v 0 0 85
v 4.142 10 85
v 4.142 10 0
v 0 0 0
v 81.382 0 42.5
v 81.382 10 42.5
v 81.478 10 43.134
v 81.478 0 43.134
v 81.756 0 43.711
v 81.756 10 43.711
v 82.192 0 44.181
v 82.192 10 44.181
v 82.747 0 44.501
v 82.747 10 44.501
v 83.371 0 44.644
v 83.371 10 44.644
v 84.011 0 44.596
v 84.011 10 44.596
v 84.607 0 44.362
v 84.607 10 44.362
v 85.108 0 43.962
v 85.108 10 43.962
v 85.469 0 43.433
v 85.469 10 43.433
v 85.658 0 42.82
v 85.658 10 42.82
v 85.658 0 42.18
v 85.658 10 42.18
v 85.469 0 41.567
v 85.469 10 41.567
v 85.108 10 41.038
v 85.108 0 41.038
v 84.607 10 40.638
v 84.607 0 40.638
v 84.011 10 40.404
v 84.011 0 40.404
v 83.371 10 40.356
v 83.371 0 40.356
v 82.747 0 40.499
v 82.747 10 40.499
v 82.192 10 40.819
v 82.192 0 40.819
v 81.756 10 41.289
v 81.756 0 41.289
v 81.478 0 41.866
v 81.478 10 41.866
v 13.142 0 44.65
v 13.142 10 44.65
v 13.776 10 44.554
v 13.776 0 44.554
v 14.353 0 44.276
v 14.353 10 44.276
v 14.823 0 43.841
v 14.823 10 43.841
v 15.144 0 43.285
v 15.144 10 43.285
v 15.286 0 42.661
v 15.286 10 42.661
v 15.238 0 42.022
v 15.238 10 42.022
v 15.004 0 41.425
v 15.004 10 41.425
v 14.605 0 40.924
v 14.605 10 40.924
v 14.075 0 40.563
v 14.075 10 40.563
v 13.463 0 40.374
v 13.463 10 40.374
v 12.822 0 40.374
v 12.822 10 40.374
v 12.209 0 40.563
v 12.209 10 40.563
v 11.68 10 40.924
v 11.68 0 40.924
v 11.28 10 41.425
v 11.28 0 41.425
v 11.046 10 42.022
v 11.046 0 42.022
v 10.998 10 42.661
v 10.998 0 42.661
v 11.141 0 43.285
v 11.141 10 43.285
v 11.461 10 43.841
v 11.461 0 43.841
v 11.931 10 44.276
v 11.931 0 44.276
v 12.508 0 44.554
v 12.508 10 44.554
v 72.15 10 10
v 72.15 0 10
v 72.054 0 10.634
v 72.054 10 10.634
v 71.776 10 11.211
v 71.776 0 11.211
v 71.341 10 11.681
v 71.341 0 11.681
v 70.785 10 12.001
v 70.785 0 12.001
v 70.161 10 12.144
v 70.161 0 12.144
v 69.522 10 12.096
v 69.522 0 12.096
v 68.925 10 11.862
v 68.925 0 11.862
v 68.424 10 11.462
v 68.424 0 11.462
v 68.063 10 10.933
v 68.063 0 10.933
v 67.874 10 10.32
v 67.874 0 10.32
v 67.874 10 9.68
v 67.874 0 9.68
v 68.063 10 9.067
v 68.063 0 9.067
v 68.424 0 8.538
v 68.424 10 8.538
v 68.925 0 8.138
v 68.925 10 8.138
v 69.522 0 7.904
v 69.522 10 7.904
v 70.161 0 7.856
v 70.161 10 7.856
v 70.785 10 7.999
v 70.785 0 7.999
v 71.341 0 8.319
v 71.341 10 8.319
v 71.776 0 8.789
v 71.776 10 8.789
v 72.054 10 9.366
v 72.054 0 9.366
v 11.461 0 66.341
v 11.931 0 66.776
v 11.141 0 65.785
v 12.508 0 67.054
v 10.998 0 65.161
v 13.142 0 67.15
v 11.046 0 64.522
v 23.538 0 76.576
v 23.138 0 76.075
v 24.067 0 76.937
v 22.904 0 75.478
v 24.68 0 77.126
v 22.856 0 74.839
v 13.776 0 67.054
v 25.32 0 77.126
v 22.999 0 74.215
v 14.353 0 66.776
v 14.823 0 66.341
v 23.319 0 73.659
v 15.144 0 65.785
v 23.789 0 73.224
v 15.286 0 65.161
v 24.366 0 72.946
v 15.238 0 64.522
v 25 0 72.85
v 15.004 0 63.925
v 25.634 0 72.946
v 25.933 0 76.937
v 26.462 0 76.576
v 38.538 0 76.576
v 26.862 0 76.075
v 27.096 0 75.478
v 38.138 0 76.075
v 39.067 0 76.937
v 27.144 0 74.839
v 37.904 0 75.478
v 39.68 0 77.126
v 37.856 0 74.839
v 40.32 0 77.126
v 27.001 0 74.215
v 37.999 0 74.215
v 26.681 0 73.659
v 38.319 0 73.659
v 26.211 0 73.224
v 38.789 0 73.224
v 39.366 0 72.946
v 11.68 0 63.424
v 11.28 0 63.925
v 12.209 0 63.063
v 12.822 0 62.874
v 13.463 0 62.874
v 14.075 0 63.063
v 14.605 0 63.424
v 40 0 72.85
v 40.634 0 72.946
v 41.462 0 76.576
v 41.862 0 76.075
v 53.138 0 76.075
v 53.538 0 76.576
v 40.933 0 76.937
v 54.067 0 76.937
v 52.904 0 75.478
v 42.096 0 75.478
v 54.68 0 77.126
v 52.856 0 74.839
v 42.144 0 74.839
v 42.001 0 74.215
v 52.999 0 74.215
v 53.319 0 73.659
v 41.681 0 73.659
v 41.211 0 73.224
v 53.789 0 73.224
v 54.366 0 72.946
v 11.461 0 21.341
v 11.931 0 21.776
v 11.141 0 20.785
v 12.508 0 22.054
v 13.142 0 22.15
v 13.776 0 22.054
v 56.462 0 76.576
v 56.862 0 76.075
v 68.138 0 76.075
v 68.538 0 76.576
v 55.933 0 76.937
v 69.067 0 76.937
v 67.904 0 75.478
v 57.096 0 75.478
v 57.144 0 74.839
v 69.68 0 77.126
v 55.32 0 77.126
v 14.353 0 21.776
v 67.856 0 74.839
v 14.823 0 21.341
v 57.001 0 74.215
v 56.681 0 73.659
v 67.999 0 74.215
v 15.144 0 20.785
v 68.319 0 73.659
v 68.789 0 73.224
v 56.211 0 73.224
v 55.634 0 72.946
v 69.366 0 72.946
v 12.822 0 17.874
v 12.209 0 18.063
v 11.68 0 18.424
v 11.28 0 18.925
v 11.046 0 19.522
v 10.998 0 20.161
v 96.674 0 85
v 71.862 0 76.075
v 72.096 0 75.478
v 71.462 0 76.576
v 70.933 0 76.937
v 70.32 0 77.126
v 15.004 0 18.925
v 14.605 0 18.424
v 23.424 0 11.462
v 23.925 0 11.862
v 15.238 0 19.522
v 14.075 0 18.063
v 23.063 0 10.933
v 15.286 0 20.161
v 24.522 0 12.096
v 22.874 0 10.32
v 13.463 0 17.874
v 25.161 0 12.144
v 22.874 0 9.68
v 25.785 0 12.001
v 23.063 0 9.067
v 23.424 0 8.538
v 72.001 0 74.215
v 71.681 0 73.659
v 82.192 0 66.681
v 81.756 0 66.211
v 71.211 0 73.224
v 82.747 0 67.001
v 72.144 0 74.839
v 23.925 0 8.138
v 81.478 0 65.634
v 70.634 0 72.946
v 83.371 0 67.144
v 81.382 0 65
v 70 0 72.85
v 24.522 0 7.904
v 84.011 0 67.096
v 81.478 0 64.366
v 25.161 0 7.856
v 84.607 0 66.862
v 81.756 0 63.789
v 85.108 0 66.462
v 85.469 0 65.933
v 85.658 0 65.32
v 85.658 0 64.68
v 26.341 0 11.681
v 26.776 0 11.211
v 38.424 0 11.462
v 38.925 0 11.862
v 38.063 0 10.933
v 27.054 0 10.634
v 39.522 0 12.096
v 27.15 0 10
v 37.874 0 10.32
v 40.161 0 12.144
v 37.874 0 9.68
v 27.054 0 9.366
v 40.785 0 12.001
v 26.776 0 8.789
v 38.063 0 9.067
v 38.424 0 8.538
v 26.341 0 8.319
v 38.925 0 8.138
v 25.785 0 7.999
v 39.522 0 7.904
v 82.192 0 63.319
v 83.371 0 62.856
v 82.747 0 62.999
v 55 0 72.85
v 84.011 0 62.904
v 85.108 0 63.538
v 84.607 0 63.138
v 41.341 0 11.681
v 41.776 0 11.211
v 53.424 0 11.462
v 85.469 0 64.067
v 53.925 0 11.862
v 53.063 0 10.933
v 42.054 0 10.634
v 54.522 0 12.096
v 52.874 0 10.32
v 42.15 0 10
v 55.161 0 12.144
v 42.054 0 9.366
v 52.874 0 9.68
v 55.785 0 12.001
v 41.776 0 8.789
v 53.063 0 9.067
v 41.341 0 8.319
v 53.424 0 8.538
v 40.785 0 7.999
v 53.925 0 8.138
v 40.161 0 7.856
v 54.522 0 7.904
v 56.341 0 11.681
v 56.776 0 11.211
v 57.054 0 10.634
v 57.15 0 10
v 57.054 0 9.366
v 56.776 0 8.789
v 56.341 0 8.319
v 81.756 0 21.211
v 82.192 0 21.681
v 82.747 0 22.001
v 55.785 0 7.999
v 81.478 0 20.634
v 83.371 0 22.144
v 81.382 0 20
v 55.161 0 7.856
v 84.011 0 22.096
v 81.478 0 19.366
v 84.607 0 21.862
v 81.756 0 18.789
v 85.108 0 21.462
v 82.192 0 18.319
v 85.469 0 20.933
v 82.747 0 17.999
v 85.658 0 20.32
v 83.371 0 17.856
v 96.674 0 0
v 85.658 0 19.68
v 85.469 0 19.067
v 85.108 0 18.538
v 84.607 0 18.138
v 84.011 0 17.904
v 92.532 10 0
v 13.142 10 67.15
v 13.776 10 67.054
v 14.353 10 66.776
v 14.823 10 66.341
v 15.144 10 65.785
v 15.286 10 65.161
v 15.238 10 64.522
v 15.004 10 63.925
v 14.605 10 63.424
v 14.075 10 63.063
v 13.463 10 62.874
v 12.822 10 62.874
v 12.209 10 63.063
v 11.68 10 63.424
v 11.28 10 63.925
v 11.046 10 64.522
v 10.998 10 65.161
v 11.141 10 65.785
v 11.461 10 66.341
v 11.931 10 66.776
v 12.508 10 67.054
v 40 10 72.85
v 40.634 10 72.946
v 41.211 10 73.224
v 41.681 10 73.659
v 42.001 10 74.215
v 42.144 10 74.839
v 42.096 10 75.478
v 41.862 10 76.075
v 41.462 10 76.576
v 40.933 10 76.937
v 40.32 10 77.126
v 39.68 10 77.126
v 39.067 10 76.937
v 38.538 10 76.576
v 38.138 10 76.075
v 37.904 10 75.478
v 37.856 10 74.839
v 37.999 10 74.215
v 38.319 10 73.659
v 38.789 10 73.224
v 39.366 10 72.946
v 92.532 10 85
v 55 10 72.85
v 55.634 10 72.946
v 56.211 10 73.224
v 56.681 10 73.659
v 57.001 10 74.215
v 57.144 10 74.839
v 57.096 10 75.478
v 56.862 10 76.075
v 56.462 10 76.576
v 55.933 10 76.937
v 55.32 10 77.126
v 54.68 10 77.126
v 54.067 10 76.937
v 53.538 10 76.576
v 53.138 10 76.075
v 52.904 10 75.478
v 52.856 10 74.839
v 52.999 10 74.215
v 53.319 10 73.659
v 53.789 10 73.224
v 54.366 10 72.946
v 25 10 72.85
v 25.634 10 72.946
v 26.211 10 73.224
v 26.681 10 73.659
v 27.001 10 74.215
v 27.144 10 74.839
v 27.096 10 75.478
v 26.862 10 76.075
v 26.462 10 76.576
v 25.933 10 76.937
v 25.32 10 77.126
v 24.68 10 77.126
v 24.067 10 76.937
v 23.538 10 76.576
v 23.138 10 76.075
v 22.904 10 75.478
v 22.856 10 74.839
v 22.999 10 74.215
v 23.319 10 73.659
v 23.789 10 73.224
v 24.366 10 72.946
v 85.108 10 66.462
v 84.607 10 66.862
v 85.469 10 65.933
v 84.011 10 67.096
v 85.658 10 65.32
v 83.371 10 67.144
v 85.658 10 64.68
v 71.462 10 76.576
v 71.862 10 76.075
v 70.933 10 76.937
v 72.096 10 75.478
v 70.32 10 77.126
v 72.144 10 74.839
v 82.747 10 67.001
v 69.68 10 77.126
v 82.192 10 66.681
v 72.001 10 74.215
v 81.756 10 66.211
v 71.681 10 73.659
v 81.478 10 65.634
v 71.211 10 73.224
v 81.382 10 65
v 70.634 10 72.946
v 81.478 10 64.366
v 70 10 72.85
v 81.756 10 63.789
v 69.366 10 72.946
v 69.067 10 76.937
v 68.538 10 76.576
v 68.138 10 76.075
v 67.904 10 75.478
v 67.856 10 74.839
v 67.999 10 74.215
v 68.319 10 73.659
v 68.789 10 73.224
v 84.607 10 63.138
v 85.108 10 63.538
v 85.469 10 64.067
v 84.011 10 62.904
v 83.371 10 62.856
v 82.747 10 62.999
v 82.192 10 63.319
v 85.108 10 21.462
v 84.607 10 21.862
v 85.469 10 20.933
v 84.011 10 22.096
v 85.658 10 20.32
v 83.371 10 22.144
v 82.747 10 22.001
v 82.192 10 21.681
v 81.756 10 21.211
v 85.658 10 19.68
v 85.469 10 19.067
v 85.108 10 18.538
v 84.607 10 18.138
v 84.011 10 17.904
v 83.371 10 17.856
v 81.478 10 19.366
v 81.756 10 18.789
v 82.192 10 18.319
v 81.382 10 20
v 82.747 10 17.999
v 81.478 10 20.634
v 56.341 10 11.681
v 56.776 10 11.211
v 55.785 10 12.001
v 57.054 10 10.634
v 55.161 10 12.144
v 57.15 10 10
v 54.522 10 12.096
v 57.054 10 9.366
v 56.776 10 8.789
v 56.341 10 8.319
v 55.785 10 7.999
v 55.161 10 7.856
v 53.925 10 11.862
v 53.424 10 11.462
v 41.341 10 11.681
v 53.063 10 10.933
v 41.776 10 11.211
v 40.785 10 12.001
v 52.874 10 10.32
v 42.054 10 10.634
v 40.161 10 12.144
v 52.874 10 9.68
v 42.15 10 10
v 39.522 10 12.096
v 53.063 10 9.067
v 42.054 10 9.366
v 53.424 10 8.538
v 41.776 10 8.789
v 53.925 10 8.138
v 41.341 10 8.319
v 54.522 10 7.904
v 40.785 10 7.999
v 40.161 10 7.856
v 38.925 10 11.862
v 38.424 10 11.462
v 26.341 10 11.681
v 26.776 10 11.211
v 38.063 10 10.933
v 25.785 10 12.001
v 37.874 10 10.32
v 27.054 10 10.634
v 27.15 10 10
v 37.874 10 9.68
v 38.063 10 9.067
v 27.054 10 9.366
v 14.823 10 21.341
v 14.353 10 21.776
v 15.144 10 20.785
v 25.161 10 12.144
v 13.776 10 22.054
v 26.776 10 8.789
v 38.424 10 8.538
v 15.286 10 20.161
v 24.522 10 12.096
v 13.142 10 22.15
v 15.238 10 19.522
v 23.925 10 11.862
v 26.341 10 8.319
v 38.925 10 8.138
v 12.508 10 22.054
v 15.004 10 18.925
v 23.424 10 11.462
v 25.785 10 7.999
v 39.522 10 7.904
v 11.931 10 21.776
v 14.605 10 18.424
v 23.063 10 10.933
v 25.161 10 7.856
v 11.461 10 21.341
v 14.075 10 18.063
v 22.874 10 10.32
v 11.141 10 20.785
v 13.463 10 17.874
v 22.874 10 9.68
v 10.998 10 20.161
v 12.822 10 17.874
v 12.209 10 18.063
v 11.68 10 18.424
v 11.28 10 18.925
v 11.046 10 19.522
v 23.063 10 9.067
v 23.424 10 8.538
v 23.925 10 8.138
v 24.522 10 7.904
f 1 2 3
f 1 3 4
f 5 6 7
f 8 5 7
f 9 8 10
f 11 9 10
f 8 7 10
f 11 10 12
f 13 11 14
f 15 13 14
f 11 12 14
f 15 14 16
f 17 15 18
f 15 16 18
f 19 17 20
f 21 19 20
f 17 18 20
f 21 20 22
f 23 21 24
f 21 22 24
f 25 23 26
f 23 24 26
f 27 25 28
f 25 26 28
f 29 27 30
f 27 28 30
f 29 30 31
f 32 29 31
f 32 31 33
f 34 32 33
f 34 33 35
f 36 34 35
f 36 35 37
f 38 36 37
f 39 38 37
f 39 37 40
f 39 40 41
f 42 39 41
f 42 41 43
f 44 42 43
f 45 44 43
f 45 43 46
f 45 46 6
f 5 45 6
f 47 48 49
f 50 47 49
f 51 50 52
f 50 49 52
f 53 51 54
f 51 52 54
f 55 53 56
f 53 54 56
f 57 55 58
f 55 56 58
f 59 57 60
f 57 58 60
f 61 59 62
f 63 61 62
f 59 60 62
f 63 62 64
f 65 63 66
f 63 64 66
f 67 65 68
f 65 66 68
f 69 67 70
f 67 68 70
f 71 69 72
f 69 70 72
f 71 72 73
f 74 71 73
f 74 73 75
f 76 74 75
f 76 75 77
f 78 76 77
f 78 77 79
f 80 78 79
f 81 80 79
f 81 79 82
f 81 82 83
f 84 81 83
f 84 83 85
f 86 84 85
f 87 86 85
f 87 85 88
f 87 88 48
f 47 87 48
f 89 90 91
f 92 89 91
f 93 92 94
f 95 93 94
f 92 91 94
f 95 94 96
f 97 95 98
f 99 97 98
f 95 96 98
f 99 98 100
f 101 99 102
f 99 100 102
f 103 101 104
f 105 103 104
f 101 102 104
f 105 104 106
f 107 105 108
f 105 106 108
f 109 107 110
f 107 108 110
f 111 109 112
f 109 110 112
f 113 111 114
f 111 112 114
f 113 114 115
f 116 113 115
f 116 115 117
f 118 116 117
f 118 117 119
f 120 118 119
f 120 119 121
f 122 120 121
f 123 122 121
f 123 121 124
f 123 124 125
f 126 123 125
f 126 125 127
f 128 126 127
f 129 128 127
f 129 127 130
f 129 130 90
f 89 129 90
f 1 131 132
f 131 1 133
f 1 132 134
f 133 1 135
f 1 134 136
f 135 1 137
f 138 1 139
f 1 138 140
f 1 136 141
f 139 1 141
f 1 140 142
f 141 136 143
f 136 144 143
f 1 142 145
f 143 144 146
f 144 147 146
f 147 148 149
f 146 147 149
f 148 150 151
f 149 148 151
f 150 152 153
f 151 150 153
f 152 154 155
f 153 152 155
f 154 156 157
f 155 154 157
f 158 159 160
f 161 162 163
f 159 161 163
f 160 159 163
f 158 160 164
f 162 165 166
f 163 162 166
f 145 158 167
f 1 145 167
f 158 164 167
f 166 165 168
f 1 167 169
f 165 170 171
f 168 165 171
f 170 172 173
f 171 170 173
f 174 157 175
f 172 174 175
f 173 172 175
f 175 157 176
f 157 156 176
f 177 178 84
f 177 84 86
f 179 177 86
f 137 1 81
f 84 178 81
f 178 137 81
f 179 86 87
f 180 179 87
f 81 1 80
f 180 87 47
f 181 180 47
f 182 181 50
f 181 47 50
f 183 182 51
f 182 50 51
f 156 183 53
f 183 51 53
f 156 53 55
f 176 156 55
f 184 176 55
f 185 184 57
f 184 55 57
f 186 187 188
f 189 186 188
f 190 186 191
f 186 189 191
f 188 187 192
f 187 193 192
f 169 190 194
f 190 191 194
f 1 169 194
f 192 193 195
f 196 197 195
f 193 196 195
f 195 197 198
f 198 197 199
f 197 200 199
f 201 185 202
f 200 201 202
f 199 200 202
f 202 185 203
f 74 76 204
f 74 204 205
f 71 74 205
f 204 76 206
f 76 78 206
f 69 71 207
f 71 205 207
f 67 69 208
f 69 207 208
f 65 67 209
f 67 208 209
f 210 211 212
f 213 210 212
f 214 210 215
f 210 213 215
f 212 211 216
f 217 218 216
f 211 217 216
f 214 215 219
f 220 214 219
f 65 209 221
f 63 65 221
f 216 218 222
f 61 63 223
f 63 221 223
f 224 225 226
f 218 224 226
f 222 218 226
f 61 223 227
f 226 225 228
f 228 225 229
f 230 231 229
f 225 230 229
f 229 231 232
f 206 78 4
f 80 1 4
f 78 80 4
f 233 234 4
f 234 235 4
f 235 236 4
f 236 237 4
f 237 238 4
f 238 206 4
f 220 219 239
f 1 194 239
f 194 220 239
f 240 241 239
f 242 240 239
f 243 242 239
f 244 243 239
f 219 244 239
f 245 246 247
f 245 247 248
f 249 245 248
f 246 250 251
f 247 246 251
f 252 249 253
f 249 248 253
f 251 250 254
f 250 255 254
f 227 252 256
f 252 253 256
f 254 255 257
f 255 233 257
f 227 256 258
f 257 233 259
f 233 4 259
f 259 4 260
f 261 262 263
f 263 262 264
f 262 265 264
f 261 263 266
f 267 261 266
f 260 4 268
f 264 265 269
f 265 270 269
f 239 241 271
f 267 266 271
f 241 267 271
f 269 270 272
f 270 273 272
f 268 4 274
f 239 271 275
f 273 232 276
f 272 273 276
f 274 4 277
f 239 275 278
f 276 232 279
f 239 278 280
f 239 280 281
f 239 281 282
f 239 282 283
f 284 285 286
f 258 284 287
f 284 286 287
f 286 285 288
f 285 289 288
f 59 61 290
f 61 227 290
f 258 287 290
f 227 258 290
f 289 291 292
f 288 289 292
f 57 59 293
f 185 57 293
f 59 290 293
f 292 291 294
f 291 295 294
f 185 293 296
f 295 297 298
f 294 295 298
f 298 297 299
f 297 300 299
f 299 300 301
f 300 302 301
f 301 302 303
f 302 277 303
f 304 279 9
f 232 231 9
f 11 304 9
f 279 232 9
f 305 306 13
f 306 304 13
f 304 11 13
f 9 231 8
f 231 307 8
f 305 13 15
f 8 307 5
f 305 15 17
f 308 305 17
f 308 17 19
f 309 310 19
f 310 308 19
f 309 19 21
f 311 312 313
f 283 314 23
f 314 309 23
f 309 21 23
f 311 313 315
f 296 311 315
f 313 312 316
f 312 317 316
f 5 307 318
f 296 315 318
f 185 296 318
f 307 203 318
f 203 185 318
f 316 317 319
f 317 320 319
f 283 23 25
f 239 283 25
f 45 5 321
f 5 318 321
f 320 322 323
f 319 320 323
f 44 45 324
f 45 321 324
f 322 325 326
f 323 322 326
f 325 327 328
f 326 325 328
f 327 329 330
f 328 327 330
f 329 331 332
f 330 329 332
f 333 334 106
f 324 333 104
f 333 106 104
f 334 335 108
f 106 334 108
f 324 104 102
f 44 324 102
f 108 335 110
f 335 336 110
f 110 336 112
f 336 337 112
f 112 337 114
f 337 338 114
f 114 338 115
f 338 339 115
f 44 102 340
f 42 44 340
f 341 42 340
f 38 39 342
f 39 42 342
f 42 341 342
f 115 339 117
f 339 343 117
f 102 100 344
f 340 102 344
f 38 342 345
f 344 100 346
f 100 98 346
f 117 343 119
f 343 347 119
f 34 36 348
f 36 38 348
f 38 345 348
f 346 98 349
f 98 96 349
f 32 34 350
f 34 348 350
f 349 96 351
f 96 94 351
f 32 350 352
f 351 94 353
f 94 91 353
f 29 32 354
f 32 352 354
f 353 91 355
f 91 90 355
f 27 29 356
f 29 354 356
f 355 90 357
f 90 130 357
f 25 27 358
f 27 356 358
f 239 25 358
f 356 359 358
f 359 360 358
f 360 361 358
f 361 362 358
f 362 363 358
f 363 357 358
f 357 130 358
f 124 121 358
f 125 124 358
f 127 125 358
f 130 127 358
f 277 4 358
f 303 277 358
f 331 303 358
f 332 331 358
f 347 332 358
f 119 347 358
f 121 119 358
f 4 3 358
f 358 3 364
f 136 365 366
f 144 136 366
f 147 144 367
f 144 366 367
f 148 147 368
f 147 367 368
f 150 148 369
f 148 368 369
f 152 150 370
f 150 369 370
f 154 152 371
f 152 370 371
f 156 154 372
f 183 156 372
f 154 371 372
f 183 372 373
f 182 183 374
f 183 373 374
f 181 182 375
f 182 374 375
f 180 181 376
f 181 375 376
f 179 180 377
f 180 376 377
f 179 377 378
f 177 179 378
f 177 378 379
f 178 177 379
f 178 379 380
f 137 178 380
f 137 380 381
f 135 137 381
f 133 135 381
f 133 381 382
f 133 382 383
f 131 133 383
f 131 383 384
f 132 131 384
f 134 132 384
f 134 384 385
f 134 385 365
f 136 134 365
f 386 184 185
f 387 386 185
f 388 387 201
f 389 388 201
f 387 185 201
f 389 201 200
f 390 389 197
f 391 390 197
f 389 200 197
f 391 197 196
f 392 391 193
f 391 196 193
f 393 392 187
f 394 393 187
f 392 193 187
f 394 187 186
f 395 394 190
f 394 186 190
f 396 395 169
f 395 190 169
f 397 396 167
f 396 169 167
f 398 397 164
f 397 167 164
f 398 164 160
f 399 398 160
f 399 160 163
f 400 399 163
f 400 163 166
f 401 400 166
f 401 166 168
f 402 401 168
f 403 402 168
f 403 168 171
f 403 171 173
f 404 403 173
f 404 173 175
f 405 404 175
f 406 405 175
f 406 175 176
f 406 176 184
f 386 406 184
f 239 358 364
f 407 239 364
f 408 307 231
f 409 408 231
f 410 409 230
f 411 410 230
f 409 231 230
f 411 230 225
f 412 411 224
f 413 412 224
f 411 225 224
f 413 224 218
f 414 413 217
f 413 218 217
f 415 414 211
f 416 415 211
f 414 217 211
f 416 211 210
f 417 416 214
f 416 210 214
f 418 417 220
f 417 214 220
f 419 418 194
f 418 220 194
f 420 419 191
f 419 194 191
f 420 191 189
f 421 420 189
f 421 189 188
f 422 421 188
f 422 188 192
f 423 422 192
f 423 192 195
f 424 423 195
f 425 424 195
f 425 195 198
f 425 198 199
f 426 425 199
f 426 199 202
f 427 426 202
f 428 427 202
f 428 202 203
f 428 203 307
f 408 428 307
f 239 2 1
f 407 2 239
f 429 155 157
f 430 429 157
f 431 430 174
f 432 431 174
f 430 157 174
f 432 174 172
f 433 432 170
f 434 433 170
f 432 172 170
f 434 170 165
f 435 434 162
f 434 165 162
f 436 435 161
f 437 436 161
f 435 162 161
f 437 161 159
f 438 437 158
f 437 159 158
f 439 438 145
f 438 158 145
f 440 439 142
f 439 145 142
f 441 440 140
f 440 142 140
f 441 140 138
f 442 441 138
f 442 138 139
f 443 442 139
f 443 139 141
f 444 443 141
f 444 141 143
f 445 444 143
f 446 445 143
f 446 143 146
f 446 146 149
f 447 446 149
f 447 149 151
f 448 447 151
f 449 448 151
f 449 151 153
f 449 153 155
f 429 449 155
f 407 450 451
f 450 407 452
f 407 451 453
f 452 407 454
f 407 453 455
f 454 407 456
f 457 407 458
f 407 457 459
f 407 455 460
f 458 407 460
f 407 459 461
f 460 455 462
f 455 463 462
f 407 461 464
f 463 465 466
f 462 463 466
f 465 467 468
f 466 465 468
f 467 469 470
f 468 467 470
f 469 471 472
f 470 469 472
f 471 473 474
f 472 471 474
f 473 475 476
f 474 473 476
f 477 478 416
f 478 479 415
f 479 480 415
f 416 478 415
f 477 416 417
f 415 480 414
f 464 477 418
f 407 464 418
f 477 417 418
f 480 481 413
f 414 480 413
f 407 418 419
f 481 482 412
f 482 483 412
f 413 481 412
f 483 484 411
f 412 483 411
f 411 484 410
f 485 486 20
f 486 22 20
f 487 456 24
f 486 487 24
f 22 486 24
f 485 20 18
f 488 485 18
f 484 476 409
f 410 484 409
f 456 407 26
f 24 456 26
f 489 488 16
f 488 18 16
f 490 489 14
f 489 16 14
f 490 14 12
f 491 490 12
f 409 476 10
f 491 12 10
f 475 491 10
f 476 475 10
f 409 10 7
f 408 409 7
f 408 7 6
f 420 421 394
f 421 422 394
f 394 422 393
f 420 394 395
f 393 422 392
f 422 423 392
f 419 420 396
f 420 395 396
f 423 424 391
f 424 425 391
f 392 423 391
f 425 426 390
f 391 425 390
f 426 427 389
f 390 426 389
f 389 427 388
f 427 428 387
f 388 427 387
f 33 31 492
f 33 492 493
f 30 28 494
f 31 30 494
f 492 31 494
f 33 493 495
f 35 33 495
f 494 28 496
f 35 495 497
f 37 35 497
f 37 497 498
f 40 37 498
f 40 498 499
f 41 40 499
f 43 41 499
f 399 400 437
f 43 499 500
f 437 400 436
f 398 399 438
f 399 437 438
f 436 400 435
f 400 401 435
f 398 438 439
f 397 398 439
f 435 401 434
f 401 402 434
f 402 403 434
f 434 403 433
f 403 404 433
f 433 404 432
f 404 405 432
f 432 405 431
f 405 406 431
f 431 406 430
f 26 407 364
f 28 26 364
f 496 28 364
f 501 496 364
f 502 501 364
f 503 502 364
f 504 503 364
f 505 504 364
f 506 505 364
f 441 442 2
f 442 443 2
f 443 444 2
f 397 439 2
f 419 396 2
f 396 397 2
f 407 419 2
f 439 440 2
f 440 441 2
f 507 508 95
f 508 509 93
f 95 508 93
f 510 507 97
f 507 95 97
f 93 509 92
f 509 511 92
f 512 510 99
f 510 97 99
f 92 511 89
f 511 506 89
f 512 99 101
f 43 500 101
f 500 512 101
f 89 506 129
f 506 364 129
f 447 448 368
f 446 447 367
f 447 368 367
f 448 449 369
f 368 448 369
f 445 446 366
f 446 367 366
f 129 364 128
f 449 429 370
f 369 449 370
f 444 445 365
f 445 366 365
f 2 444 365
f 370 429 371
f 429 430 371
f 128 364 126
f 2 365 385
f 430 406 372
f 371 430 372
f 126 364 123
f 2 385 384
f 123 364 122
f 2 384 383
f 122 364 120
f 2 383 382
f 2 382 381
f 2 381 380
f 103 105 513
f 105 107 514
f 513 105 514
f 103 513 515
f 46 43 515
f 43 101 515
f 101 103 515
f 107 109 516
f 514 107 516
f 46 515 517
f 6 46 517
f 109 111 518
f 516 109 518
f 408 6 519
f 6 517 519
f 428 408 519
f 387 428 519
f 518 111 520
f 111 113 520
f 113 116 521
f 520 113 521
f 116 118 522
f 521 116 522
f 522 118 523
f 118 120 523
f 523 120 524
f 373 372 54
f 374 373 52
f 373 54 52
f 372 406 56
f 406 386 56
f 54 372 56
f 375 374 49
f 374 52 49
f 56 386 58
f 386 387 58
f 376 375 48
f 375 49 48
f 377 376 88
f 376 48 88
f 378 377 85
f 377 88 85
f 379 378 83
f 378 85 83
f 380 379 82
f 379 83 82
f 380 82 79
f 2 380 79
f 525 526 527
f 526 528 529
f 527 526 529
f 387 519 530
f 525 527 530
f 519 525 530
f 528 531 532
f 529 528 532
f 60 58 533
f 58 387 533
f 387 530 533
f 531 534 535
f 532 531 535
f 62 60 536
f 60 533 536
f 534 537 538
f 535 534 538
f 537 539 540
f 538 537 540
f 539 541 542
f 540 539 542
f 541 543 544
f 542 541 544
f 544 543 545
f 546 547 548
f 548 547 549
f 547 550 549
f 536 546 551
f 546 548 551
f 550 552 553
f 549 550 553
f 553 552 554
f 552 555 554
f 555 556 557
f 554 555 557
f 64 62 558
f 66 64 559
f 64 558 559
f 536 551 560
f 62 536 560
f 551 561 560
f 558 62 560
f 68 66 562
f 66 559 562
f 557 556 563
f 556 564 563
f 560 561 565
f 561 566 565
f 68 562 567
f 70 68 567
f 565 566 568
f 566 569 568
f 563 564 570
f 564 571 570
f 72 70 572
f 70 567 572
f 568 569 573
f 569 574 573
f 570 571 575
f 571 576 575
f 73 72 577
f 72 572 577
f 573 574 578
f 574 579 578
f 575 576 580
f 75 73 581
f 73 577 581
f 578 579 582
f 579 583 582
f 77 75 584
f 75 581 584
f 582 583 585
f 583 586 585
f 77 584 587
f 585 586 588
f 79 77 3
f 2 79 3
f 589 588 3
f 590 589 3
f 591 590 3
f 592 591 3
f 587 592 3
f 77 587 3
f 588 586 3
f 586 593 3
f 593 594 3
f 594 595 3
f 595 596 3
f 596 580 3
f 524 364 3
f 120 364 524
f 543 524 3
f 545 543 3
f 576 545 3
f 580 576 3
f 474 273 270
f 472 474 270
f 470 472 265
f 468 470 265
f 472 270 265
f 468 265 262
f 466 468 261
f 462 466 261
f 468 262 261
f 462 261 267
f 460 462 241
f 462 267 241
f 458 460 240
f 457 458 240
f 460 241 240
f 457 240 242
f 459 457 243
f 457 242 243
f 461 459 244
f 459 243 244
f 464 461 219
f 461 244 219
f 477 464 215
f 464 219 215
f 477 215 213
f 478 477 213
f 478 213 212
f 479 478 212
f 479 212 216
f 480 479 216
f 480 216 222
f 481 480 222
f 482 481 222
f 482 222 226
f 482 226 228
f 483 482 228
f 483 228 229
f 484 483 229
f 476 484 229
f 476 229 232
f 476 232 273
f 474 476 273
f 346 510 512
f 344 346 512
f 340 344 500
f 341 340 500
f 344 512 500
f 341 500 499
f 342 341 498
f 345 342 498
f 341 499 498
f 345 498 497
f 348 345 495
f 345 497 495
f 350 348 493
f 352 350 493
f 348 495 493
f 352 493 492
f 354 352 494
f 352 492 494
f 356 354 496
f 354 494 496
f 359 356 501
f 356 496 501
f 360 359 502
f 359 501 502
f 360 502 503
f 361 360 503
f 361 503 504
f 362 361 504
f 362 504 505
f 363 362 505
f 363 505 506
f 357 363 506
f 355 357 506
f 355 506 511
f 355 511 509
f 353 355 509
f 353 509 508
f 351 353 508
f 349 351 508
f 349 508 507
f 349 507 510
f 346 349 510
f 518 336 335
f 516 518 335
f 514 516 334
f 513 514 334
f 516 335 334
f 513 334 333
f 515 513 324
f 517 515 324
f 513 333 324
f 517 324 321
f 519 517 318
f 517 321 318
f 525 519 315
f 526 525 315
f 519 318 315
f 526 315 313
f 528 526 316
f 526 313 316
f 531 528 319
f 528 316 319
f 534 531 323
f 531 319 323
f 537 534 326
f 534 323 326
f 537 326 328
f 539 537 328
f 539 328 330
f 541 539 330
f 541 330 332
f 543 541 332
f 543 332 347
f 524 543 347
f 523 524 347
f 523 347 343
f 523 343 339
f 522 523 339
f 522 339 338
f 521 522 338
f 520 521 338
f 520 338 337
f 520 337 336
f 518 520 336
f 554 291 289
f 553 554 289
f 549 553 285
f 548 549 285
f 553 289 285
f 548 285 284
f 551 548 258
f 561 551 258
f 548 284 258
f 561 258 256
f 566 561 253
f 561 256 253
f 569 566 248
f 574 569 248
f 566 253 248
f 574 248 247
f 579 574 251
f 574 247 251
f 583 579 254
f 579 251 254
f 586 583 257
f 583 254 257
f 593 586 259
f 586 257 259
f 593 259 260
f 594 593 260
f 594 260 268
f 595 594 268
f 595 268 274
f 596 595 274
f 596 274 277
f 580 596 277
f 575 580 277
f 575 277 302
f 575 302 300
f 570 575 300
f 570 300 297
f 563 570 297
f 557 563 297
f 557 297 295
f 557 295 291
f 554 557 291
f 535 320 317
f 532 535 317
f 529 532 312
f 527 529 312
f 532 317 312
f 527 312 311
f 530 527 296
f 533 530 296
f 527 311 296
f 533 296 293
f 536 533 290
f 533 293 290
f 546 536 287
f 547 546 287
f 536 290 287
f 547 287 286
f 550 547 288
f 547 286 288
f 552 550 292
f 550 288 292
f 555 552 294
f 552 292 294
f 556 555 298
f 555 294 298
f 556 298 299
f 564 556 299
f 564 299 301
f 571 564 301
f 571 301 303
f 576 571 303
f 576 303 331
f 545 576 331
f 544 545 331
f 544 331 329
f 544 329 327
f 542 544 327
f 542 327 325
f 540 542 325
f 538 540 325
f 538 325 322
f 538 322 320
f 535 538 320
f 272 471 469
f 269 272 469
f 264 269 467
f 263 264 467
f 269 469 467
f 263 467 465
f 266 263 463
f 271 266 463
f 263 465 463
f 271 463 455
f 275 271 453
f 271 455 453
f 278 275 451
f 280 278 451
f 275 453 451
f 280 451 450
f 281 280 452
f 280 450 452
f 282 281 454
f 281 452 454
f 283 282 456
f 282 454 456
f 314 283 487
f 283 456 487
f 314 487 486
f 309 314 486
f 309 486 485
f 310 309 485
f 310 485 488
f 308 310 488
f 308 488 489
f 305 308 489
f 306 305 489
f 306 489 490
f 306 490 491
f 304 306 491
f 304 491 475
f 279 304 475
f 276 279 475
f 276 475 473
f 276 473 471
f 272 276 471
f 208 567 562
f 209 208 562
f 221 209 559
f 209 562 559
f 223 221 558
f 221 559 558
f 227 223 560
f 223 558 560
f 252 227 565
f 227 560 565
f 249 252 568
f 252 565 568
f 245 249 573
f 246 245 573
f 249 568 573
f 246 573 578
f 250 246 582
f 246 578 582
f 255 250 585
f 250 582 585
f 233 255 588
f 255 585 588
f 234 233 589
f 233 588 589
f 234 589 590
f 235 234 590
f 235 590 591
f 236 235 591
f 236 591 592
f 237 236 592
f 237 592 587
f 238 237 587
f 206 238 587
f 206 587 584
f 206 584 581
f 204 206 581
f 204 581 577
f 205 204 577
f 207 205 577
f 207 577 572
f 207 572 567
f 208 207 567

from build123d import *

# Parameters (mm, degrees)
BOSS_EXTRUDE1_DEPTH = 85
SKETCH3_R           = 2.15
CUT_EXTRUDE1_DEPTH  = 85
LPATTERN1_COUNT     = 4
LPATTERN1_PITCH     = 15
SKETCH4_R           = 2.15
CUT_EXTRUDE2_DEPTH  = 85


with BuildPart() as part:
    # Sketch2 → Boss-Extrude1 (new body)
    with BuildSketch(Plane.XY):
        Polygon((0, 0), (96.674271247, 0), (92.532135624, 10), (4.142135624, 10), align=None)
    extrude(amount=BOSS_EXTRUDE1_DEPTH)

    # Sketch3 → Cut-Extrude1 (cut)
    with BuildSketch(Plane.XZ):
        with Locations(Location((25, 75, 0), (0, 0, 270))):
            Circle(SKETCH3_R)
        with Locations((25, 10)):
            Circle(SKETCH3_R)
    cut_extrude1 = extrude(amount=-CUT_EXTRUDE1_DEPTH, mode=Mode.SUBTRACT)

    # LPattern1: Cut-Extrude1 ×4
    with Locations(*[(i * LPATTERN1_PITCH, 0, 0) for i in range(1, LPATTERN1_COUNT)]):
        add(cut_extrude1, mode=Mode.SUBTRACT)

    # Sketch4 → Cut-Extrude2 (cut)
    with BuildSketch(Plane(origin=(0, 10, 0), x_dir=(1, 0, 0), z_dir=(0, 1, 0))):
        with Locations(Location((83.532135624, -20, 0), (0, 0, 180))):
            Circle(SKETCH4_R)
        with Locations(Location((83.532135624, -42.5, 0), (0, 0, 180))):
            Circle(SKETCH4_R)
        with Locations(Location((83.532135624, -65, 0), (0, 0, 180))):
            Circle(SKETCH4_R)
        with Locations(Location((13.142135624, -65, 0), (0, 0, 270))):
            Circle(SKETCH4_R)
        with Locations(Location((13.142135624, -42.5, 0), (0, 0, 270))):
            Circle(SKETCH4_R)
        with Locations(Location((13.142135624, -20, 0), (0, 0, 270))):
            Circle(SKETCH4_R)
    extrude(amount=-CUT_EXTRUDE2_DEPTH, mode=Mode.SUBTRACT)


solid = part.part
